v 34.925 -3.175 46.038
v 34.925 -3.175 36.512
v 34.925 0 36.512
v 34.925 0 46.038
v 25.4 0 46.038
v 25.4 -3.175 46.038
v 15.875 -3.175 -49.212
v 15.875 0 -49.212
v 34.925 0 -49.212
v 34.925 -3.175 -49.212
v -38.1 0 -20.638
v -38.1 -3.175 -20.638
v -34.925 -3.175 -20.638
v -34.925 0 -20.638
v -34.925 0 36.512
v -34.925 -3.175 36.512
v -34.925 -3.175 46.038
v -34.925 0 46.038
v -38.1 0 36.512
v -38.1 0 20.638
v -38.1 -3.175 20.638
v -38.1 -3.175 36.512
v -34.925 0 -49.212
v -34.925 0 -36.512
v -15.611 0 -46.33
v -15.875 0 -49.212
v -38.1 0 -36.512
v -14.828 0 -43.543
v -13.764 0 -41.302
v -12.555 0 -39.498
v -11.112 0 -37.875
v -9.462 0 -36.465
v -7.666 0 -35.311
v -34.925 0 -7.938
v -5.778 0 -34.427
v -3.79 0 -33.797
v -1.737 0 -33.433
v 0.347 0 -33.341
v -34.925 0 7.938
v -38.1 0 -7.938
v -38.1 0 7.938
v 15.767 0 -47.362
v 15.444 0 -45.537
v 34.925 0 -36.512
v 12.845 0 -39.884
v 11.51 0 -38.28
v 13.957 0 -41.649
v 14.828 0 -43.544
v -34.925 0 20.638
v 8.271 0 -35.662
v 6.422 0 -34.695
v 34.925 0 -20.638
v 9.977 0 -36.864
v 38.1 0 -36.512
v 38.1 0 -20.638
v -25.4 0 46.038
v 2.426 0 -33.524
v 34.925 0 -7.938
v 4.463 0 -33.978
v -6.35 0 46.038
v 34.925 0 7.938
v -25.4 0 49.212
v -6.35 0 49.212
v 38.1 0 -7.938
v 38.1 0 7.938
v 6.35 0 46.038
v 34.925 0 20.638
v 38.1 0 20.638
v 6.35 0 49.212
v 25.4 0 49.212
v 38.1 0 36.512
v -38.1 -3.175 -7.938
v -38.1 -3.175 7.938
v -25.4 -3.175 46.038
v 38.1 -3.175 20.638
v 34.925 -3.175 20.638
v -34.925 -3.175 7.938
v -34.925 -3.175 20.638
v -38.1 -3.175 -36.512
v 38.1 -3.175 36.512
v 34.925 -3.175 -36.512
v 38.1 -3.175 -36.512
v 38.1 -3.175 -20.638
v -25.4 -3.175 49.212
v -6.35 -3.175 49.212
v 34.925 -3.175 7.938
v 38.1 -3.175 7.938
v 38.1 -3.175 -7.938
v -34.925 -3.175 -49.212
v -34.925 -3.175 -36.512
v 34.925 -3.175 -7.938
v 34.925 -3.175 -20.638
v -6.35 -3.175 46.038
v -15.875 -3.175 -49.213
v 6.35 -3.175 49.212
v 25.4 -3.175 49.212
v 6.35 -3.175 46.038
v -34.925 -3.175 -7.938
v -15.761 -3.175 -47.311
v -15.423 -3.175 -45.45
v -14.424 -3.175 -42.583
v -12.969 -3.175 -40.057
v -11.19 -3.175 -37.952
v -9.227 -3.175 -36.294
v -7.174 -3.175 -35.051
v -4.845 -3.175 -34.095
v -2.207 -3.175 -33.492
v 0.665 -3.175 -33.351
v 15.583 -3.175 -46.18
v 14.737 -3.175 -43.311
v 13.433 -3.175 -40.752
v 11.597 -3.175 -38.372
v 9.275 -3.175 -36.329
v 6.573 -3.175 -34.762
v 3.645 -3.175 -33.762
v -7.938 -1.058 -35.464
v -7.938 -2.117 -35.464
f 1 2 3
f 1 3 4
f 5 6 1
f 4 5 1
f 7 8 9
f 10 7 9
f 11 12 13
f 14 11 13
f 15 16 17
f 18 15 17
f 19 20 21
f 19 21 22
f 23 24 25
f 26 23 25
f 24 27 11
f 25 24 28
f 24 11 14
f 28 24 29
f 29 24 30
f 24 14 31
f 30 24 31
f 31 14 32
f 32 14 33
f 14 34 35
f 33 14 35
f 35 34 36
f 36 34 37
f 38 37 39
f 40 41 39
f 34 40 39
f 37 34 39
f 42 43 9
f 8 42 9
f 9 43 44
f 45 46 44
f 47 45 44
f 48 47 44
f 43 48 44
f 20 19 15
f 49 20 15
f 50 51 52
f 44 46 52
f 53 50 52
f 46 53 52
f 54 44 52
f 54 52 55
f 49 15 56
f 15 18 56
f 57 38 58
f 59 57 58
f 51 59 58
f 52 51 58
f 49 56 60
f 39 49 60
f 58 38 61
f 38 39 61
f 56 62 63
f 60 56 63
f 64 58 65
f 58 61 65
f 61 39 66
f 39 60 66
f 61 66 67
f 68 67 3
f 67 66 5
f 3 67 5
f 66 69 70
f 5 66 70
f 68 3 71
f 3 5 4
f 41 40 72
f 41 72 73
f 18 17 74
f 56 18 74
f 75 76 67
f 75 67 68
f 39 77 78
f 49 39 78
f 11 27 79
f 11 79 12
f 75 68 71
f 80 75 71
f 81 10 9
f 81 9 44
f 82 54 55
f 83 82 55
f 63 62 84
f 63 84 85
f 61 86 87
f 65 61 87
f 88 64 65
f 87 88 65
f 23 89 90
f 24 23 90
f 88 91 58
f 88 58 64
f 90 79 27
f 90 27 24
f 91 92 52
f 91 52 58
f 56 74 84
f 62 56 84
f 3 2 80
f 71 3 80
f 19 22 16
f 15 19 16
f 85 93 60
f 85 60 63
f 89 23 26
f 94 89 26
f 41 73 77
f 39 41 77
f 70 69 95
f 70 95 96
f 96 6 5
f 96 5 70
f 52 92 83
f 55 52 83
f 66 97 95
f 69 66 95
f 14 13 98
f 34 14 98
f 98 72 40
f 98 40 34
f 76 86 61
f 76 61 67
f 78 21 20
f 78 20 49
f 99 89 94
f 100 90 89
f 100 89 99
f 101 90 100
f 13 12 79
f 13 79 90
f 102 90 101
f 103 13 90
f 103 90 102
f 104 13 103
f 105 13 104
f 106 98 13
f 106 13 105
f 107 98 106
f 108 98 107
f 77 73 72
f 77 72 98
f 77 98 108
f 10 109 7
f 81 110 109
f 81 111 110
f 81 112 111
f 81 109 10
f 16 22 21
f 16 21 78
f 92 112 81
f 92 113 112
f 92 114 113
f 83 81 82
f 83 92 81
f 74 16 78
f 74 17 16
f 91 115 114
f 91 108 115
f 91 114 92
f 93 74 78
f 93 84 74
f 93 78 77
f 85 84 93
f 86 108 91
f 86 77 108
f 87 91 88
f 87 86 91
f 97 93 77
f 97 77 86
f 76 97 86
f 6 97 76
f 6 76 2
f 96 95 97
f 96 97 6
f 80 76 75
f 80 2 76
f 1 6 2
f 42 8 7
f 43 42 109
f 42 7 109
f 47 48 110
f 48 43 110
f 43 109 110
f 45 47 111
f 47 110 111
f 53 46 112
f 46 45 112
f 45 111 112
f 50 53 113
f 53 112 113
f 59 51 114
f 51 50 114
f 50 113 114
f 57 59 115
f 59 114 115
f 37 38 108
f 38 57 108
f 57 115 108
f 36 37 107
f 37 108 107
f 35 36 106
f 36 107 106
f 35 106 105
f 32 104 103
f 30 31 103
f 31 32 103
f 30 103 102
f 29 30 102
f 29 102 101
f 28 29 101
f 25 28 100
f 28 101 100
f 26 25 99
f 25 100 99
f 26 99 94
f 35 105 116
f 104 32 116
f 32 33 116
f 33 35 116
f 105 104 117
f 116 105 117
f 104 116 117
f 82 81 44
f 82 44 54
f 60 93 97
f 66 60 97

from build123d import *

# Parameters (mm, degrees)
F0_W     = 76.2
F0_H     = 98.425
F1_DEPTH = 3.175
F2_W     = 12.7
F2_H     = 3.175
F3_DEPTH = 3.176
F4_W     = 3.175
F4_H     = 12.7
F5_DEPTH = 3.176
F7_DEPTH = 3.176


with BuildPart() as f1:
    # F0 (on Front) → F1 (new body)
    with BuildSketch(Plane.XZ):
        Rectangle(F0_W, F0_H)
    extrude(amount=F1_DEPTH)

    # F2 (on face) → F3 (cut, through all)
    with BuildSketch(Plane.XZ.offset(3.175)):
        with Locations((-31.75, 47.625)):
            Rectangle(F2_W, F2_H)
        with Locations((0, 47.625)):
            Rectangle(F2_W, F2_H)
        with Locations((31.75, 47.625)):
            Rectangle(F2_W, F2_H)
    extrude(amount=-F3_DEPTH, mode=Mode.SUBTRACT)

    # F4 (on face) → F5 (cut, through all)
    with BuildSketch(Plane.XZ.offset(3.175)):
        with Locations((-36.5125, 42.8625)):
            Rectangle(F4_W, F4_H)
        with Locations((-36.5125, 14.2875)):
            Rectangle(F4_W, F4_H)
        with Locations((-36.5125, -14.2875)):
            Rectangle(F4_W, F4_H)
        with Locations((-36.5125, -42.8625)):
            Rectangle(F4_W, F4_H)
        with Locations((36.5125, -42.8625)):
            Rectangle(F4_W, F4_H)
        with Locations((36.5125, 14.2875)):
            Rectangle(F4_W, F4_H)
        with Locations((36.5125, -14.2875)):
            Rectangle(F4_W, F4_H)
        with Locations((36.5125, 42.8625)):
            Rectangle(F4_W, F4_H)
    extrude(amount=-F5_DEPTH, mode=Mode.SUBTRACT)

    # F6 (on face) → F7 (cut, through all)
    with BuildSketch(Plane.XZ.offset(3.175)):
        with BuildLine():
            add(Edge.make_bspline(
                [(15.875, -49.2125), (15.875, -21.716193), (-7.9375, -35.464347), (-31.75, -49.2125), (-7.9375, -62.960653), (15.875, -76.708807), (15.875, -49.2125)],
                knots=[0, 0, 0, 2.094395, 2.094395, 4.18879, 4.18879, 6.283185, 6.283185, 6.283185], degree=2, weights=[1, 0.5, 1, 0.5, 1, 0.5, 1]))
        make_face()
    extrude(amount=-F7_DEPTH, mode=Mode.SUBTRACT)


solid = f1.part
